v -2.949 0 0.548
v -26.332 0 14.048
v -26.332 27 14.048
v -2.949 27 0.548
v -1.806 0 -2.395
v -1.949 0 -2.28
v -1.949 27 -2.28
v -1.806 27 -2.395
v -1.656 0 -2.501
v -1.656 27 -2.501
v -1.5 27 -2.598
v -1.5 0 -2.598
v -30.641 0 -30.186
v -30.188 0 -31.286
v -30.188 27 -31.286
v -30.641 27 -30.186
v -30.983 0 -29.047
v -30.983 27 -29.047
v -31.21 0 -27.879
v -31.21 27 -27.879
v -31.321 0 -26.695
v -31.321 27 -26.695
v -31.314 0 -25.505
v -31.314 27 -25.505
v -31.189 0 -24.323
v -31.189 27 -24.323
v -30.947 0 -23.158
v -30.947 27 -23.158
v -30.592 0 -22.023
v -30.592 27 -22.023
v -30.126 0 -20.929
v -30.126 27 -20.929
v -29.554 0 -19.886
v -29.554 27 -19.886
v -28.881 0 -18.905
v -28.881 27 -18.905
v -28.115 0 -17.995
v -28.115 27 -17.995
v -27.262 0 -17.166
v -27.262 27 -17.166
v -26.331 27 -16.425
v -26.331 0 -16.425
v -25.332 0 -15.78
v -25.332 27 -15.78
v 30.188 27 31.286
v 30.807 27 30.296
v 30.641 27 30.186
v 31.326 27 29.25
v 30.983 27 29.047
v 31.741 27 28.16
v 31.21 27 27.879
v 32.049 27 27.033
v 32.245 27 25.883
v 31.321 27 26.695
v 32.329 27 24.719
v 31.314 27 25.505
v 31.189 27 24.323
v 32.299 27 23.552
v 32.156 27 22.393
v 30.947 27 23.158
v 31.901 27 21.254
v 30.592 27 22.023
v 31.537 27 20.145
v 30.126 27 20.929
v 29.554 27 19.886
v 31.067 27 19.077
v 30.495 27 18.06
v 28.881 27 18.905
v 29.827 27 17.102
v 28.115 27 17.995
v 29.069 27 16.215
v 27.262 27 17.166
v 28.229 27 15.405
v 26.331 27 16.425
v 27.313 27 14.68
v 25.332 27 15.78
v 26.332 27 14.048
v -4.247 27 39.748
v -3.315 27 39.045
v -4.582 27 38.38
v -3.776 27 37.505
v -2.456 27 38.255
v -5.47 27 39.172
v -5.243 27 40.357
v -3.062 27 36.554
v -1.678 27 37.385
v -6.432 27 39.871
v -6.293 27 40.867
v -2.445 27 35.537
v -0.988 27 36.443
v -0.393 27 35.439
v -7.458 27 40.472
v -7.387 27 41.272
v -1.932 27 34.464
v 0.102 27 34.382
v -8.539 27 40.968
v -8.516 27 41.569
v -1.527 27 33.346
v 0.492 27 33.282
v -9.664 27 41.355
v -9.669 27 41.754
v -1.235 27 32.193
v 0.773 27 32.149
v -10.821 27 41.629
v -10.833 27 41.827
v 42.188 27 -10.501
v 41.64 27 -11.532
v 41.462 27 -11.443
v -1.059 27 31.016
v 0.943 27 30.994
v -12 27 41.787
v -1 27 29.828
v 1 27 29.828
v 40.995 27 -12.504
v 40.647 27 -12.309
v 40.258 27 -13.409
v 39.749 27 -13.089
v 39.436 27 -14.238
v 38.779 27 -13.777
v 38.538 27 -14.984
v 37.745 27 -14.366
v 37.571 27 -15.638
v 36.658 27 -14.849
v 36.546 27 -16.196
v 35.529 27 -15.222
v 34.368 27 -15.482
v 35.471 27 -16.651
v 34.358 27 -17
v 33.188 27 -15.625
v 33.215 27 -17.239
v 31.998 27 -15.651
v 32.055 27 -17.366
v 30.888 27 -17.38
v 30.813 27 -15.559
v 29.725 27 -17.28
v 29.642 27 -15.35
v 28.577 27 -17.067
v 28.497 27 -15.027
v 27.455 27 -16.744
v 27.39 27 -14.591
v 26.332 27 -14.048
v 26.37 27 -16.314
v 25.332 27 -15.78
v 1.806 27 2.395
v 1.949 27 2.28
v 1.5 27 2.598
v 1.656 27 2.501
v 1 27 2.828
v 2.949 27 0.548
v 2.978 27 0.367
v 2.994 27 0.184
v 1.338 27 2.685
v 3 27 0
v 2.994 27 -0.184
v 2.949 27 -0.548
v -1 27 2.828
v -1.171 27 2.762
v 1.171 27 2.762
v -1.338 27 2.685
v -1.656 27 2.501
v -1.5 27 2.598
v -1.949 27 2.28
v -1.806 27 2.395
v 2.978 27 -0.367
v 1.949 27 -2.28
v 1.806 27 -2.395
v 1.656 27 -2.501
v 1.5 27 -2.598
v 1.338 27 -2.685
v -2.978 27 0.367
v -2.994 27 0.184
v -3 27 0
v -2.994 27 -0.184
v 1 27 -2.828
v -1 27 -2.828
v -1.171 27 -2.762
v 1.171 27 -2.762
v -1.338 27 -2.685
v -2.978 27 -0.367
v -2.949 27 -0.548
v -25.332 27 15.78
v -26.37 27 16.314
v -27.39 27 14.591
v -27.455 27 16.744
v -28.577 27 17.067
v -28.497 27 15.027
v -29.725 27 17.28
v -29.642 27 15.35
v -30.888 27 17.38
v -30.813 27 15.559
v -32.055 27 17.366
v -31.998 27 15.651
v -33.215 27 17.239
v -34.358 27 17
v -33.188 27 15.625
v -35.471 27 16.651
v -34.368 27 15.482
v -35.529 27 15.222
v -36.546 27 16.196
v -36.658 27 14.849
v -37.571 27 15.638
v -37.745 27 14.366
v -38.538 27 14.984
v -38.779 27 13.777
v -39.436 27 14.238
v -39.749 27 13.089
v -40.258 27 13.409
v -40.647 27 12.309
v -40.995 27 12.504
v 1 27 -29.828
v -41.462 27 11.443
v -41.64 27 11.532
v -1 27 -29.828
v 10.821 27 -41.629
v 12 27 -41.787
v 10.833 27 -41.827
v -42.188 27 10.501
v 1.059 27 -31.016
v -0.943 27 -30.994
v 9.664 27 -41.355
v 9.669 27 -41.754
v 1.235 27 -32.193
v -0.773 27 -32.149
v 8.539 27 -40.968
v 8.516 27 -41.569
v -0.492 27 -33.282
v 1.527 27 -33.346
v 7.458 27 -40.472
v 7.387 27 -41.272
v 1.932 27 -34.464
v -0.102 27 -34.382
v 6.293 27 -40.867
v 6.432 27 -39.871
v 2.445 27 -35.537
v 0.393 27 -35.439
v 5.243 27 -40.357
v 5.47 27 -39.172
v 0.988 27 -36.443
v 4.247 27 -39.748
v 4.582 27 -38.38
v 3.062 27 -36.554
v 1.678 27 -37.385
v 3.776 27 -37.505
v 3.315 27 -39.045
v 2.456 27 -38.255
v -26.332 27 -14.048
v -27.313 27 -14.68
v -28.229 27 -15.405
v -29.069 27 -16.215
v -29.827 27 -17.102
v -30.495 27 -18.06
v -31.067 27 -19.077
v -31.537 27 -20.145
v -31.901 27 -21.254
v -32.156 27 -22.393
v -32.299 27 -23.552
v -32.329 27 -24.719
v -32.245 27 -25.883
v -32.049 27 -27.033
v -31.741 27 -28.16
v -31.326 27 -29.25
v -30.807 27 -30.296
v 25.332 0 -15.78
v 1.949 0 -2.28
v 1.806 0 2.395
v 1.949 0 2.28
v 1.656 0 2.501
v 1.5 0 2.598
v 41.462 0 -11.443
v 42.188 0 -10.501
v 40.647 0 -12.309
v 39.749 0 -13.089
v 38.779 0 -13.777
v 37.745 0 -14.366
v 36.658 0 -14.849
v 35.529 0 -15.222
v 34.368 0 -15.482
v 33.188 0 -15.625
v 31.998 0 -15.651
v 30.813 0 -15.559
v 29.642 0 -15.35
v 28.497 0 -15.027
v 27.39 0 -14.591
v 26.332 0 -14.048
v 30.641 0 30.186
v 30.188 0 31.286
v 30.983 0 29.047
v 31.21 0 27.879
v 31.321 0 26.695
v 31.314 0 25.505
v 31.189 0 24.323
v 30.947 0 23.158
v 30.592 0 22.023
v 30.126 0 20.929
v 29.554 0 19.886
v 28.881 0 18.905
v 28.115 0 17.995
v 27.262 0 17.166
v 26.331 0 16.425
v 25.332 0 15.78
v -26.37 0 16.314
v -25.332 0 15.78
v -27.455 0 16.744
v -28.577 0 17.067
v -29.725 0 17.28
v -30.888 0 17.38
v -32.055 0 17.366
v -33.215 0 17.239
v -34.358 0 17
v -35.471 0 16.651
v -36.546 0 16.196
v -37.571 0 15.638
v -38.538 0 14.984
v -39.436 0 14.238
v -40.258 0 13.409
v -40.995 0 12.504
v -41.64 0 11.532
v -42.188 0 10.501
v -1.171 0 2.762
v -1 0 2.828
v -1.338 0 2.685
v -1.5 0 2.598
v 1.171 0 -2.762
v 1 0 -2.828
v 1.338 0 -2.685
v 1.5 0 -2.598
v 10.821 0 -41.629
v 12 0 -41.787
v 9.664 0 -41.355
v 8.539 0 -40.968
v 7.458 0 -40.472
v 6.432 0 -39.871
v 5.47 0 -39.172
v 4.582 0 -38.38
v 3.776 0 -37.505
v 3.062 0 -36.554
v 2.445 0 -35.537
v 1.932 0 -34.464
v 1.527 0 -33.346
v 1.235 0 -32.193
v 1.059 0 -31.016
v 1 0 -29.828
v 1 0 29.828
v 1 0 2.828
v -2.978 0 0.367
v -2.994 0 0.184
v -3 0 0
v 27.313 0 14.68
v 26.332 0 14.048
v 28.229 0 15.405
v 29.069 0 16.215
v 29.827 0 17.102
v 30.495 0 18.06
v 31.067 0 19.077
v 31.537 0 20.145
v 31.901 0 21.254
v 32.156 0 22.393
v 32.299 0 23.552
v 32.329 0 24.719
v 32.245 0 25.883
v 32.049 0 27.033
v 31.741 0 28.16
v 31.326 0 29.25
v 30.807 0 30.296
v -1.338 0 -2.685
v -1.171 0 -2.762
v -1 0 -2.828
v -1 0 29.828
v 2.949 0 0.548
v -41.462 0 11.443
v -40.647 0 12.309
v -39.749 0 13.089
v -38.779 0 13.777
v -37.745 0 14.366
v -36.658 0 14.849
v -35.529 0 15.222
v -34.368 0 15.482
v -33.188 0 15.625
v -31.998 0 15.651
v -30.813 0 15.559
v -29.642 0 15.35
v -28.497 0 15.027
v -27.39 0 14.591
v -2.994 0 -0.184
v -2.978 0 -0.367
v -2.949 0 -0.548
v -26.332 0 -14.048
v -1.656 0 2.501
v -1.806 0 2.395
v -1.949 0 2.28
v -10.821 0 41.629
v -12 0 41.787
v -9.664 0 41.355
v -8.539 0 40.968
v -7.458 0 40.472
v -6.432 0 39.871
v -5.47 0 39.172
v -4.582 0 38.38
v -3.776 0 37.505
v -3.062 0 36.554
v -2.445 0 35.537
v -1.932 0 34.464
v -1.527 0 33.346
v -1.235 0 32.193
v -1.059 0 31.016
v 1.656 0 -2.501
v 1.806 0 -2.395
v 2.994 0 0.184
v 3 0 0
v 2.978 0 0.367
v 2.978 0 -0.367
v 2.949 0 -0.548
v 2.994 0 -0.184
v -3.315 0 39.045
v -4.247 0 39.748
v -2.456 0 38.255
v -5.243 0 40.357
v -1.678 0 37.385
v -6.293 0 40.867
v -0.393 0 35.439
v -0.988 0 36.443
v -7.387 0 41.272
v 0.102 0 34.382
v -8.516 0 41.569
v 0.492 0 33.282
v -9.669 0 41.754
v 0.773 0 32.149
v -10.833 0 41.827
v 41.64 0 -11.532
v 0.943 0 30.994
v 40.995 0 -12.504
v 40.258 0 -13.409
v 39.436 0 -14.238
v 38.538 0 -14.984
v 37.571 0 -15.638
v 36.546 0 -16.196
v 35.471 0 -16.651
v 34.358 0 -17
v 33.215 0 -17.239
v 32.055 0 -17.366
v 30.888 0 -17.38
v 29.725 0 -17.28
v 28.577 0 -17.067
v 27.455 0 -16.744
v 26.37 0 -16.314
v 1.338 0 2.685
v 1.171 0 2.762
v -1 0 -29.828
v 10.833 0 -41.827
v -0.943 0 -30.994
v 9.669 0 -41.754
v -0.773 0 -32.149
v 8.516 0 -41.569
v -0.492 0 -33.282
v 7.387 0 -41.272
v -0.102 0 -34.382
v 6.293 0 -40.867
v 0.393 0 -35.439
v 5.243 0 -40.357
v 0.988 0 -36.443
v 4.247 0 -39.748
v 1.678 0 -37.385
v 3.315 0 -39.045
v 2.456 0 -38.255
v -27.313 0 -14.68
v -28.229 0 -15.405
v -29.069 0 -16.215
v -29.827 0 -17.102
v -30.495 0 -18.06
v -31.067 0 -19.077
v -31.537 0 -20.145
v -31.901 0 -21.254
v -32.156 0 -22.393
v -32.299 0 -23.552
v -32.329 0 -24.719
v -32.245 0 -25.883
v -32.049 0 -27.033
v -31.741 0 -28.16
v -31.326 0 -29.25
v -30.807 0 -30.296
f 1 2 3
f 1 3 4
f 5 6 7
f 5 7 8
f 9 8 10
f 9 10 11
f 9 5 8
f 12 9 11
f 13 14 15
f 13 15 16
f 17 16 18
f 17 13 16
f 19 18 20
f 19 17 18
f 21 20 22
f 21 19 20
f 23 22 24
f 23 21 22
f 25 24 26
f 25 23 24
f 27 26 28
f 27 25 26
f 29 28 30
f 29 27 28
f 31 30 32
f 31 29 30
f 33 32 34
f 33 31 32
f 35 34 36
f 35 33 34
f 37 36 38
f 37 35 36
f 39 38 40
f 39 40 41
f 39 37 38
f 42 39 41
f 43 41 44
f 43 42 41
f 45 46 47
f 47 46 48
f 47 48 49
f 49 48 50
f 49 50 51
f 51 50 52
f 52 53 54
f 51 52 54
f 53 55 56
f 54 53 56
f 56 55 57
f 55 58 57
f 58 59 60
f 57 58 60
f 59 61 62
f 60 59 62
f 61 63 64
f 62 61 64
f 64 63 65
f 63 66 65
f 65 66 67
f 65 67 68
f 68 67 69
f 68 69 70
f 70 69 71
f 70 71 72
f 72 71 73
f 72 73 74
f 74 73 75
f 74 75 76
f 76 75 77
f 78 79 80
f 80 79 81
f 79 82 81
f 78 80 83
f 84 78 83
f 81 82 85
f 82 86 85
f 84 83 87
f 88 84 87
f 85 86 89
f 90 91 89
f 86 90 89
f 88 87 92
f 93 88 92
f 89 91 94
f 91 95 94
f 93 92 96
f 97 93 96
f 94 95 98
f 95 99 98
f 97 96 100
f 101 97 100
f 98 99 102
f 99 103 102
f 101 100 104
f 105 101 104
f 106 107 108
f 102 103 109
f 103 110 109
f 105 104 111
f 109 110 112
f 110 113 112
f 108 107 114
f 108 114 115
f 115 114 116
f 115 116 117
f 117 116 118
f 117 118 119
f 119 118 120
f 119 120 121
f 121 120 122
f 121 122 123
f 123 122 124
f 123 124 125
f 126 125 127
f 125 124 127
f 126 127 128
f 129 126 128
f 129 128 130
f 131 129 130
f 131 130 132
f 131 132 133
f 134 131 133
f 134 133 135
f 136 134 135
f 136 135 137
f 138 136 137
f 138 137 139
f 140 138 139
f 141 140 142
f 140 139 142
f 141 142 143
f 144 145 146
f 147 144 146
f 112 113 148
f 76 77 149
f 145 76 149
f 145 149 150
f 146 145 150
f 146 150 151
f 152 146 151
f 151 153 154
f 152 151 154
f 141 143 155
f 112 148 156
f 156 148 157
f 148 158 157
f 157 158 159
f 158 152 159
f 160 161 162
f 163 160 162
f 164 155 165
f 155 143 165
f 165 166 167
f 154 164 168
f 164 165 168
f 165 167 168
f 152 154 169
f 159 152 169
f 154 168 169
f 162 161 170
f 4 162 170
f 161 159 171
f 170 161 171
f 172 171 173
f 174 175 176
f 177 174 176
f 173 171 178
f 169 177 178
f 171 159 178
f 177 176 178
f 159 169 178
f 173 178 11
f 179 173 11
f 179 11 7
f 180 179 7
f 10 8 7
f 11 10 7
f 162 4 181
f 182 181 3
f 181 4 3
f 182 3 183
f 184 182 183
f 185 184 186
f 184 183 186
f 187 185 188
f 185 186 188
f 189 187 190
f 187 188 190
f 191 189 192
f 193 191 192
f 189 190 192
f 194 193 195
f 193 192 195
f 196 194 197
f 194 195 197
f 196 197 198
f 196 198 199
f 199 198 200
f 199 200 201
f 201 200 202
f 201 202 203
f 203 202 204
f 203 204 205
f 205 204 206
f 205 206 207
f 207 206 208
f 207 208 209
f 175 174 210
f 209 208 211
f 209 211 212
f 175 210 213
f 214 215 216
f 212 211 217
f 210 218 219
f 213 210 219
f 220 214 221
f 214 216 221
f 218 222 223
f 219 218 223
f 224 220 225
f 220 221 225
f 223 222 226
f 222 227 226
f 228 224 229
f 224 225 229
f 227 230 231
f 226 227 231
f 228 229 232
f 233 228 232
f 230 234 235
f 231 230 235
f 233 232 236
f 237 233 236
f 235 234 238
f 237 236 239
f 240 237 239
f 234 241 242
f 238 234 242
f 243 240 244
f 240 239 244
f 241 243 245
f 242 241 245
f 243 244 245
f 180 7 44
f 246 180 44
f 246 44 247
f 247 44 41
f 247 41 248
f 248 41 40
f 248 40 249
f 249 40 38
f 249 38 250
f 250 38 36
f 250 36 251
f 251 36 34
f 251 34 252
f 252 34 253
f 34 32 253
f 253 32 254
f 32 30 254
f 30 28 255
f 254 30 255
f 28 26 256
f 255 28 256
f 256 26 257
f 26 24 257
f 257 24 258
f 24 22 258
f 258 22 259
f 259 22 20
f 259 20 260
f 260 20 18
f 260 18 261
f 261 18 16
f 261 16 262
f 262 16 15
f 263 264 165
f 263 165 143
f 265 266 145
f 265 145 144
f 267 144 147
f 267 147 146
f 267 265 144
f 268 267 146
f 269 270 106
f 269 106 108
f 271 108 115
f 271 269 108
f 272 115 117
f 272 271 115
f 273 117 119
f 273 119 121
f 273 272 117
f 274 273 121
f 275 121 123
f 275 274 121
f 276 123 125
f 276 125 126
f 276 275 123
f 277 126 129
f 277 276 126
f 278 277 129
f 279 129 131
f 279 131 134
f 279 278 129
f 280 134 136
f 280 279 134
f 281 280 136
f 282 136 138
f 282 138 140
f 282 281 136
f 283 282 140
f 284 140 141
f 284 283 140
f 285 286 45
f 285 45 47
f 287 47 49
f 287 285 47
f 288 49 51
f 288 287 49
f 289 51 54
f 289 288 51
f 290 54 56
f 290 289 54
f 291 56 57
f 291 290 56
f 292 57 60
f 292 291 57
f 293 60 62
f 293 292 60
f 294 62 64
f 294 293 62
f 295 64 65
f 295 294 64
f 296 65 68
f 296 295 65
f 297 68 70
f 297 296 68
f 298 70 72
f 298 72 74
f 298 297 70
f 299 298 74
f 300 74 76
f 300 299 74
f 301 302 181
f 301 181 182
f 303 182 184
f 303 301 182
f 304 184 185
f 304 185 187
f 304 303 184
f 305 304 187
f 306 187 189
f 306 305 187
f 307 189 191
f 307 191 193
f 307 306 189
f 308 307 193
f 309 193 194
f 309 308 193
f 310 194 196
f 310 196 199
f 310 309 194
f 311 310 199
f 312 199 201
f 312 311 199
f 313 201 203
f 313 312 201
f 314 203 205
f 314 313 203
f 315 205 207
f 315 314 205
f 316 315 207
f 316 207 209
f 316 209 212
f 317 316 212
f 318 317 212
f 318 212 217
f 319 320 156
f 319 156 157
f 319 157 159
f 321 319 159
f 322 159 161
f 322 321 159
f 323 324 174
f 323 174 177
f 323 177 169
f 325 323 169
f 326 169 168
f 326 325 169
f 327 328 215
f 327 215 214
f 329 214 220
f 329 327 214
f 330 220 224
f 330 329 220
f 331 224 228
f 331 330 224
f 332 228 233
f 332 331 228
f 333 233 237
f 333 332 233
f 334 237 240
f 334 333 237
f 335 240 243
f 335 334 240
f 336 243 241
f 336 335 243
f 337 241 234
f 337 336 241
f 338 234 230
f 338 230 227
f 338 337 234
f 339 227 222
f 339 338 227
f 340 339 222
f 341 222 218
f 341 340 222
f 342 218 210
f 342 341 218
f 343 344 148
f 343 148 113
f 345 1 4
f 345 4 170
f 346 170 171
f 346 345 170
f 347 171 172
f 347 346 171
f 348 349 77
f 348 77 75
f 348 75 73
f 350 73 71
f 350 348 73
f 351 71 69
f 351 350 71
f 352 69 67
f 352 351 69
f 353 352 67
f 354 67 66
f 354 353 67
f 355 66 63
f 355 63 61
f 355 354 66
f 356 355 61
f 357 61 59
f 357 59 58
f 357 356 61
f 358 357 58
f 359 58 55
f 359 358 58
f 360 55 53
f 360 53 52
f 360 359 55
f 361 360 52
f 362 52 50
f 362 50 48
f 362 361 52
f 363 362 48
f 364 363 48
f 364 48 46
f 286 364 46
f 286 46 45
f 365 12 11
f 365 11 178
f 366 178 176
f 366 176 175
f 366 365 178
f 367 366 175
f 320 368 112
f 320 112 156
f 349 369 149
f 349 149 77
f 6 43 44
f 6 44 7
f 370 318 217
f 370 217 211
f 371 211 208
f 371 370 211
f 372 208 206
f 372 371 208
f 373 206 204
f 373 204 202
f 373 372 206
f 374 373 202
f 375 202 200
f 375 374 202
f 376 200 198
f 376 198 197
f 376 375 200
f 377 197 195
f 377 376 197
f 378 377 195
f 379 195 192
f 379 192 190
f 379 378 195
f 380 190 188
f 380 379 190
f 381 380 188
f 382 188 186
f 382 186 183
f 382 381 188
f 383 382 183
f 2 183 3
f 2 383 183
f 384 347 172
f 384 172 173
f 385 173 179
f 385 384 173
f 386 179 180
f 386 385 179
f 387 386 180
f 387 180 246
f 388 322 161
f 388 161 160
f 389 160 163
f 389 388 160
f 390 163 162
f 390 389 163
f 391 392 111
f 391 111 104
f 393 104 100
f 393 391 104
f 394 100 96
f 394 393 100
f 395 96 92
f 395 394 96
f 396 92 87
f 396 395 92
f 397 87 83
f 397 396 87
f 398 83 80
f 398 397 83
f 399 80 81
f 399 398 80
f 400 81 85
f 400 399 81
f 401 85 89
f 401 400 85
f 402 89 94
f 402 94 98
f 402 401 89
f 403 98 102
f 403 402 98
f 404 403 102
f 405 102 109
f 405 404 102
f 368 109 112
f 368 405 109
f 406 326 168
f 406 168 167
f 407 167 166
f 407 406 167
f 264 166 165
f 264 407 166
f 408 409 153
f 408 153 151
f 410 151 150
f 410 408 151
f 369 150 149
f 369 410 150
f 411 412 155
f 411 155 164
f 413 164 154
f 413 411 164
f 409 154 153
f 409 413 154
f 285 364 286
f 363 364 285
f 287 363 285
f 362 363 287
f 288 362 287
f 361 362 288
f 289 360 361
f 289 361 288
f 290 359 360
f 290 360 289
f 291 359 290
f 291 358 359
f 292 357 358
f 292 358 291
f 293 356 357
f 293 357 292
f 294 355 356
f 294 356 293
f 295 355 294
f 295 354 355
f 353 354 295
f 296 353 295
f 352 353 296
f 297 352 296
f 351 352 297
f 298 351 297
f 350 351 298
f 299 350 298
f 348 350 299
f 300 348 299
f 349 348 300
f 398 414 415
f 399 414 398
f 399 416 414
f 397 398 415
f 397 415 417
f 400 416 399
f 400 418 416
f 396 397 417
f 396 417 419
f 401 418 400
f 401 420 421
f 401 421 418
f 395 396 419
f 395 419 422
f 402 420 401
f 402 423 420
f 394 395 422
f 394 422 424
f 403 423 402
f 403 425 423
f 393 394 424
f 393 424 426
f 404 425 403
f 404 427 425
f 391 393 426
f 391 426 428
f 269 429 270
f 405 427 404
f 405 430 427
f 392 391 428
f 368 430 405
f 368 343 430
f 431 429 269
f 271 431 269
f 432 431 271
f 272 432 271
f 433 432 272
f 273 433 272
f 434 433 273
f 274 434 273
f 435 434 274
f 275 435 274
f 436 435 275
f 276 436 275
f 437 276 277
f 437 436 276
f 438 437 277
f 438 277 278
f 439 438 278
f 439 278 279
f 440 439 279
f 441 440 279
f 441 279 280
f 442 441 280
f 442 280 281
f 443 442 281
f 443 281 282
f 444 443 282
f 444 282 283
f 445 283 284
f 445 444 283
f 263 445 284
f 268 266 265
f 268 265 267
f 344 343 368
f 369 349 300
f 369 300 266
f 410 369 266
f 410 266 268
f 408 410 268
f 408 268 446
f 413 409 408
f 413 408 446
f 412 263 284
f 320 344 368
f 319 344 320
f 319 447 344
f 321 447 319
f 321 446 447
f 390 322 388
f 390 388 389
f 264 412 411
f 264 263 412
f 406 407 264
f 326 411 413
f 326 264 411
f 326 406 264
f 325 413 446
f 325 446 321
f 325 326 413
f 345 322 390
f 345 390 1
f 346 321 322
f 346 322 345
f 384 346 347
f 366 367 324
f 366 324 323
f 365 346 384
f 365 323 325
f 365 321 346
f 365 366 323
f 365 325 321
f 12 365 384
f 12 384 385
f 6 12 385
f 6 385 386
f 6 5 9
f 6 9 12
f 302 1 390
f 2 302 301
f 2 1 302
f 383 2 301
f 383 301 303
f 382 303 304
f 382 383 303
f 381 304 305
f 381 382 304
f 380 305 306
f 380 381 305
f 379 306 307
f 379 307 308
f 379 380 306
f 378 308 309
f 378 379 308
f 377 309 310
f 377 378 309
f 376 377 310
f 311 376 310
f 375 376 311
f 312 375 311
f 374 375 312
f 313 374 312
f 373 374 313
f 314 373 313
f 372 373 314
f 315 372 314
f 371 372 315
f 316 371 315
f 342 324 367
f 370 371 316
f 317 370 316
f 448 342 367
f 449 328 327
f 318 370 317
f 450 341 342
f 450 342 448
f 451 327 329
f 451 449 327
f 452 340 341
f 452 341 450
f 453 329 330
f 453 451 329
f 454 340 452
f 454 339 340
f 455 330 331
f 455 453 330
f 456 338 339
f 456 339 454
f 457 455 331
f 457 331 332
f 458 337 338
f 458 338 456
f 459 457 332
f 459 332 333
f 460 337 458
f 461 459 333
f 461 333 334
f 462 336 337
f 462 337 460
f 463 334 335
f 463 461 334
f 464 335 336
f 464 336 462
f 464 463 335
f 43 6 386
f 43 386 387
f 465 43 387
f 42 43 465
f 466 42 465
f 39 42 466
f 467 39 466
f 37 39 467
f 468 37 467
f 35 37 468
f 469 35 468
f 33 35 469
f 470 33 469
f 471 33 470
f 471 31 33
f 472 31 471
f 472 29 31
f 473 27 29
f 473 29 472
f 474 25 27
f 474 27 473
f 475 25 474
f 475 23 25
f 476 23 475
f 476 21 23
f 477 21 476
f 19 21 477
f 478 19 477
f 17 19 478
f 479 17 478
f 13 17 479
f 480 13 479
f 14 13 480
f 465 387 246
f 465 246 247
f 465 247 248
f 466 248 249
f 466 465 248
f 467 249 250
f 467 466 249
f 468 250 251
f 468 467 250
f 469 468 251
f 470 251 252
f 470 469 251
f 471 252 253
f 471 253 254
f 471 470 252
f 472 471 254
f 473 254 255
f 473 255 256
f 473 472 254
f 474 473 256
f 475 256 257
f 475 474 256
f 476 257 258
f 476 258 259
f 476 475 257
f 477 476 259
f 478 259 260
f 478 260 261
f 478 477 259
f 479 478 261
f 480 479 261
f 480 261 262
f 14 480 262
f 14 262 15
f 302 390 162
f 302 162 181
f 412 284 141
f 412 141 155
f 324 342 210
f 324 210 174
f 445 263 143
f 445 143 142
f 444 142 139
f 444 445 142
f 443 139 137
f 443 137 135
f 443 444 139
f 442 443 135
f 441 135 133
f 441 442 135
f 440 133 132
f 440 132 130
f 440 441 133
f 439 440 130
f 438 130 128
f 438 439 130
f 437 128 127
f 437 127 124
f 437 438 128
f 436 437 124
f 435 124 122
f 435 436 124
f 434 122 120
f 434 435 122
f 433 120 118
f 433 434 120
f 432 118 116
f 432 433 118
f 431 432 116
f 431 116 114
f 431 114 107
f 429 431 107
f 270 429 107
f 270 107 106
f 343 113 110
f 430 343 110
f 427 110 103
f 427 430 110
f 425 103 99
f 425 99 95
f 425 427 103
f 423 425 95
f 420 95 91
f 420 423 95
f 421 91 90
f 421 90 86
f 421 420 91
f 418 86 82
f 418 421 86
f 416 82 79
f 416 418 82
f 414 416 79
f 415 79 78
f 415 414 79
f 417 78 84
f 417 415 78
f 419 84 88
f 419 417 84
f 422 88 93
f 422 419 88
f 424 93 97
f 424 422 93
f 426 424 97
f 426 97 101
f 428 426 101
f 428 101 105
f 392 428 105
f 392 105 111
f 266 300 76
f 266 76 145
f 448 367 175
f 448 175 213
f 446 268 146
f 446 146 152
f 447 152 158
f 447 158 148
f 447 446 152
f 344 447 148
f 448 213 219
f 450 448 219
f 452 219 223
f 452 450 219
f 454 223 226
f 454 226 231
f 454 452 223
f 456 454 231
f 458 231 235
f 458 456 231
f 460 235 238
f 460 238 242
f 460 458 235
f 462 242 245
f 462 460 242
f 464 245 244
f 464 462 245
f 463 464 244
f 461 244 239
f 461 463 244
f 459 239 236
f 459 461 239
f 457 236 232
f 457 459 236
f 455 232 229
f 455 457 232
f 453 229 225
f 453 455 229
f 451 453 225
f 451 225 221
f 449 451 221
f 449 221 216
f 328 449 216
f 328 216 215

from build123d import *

# Parameters (mm, degrees)
BOSS_EXTRUDE1_DEPTH = 27


with BuildPart() as part:
    # Sketch2 → Boss-Extrude1 (new body)
    with BuildSketch(Plane(origin=(0, 0, 0), x_dir=(1, 0, 0), z_dir=(0, 1, 0))):
        with BuildLine():
            Line((1.949489743, 2.280238966), (25.332175645, 15.780238966))
            ThreePointArc((25.332175645, 15.780238966), (34.918685713, 16.839438194), (42.188333234, 10.501039089))
            ThreePointArc((42.188333234, 10.501039089), (34.951918852, 15.366431786), (26.332175645, 14.048188159))
            Line((26.332175645, 14.048188159), (2.949489743, 0.548188159))
            ThreePointArc((2.949489743, 0.548188159), (2.987345747, 0.275255129), (3, 0))
            ThreePointArc((3, 0), (2.987345747, -0.275255129), (2.949489743, -0.548188159))
            Line((2.949489743, -0.548188159), (26.332175645, -14.048188159))
            ThreePointArc((26.332175645, -14.048188159), (32.042724118, -21.820749797), (30.188333234, -31.285648779))
            ThreePointArc((30.188333234, -31.285648779), (30.783679718, -22.586033743), (25.332175645, -15.780238966))
            Line((25.332175645, -15.780238966), (1.949489743, -2.280238966))
            ThreePointArc((1.949489743, -2.280238966), (1.732050808, -2.449489743), (1.5, -2.598076211))
            ThreePointArc((1.5, -2.598076211), (1.25529494, -2.724744871), (1, -2.828427125))
            Line((1, -2.828427125), (1, -29.828427125))
            ThreePointArc((1, -29.828427125), (-2.875961595, -38.660187991), (-12, -41.786687868))
            ThreePointArc((-12, -41.786687868), (-4.168239134, -37.952465529), (-1, -29.828427125))
            Line((-1, -29.828427125), (-1, -2.828427125))
            ThreePointArc((-1, -2.828427125), (-1.25529494, -2.724744871), (-1.5, -2.598076211))
            ThreePointArc((-1.5, -2.598076211), (-1.732050808, -2.449489743), (-1.949489743, -2.280238966))
            Line((-1.949489743, -2.280238966), (-25.332175645, -15.780238966))
            ThreePointArc((-25.332175645, -15.780238966), (-34.918685713, -16.839438194), (-42.188333234, -10.501039089))
            ThreePointArc((-42.188333234, -10.501039089), (-34.951918852, -15.366431786), (-26.332175645, -14.048188159))
            Line((-26.332175645, -14.048188159), (-2.949489743, -0.548188159))
            ThreePointArc((-2.949489743, -0.548188159), (-2.987345747, -0.275255129), (-3, 0))
            ThreePointArc((-3, 0), (-2.987345747, 0.275255129), (-2.949489743, 0.548188159))
            Line((-2.949489743, 0.548188159), (-26.332175645, 14.048188159))
            ThreePointArc((-26.332175645, 14.048188159), (-32.042724118, 21.820749797), (-30.188333234, 31.285648779))
            ThreePointArc((-30.188333234, 31.285648779), (-30.783679718, 22.586033743), (-25.332175645, 15.780238966))
            Line((-25.332175645, 15.780238966), (-1.949489743, 2.280238966))
            ThreePointArc((-1.949489743, 2.280238966), (-1.732050808, 2.449489743), (-1.5, 2.598076211))
            ThreePointArc((-1.5, 2.598076211), (-1.25529494, 2.724744871), (-1, 2.828427125))
            Line((-1, 2.828427125), (-1, 29.828427125))
            ThreePointArc((-1, 29.828427125), (2.875961595, 38.660187991), (12, 41.786687868))
            ThreePointArc((12, 41.786687868), (4.168239134, 37.952465529), (1, 29.828427125))
            Line((1, 29.828427125), (1, 2.828427125))
            ThreePointArc((1, 2.828427125), (1.25529494, 2.724744871), (1.5, 2.598076211))
            ThreePointArc((1.5, 2.598076211), (1.732050808, 2.449489743), (1.949489743, 2.280238966))
        make_face()
    extrude(amount=BOSS_EXTRUDE1_DEPTH)


solid = part.part
